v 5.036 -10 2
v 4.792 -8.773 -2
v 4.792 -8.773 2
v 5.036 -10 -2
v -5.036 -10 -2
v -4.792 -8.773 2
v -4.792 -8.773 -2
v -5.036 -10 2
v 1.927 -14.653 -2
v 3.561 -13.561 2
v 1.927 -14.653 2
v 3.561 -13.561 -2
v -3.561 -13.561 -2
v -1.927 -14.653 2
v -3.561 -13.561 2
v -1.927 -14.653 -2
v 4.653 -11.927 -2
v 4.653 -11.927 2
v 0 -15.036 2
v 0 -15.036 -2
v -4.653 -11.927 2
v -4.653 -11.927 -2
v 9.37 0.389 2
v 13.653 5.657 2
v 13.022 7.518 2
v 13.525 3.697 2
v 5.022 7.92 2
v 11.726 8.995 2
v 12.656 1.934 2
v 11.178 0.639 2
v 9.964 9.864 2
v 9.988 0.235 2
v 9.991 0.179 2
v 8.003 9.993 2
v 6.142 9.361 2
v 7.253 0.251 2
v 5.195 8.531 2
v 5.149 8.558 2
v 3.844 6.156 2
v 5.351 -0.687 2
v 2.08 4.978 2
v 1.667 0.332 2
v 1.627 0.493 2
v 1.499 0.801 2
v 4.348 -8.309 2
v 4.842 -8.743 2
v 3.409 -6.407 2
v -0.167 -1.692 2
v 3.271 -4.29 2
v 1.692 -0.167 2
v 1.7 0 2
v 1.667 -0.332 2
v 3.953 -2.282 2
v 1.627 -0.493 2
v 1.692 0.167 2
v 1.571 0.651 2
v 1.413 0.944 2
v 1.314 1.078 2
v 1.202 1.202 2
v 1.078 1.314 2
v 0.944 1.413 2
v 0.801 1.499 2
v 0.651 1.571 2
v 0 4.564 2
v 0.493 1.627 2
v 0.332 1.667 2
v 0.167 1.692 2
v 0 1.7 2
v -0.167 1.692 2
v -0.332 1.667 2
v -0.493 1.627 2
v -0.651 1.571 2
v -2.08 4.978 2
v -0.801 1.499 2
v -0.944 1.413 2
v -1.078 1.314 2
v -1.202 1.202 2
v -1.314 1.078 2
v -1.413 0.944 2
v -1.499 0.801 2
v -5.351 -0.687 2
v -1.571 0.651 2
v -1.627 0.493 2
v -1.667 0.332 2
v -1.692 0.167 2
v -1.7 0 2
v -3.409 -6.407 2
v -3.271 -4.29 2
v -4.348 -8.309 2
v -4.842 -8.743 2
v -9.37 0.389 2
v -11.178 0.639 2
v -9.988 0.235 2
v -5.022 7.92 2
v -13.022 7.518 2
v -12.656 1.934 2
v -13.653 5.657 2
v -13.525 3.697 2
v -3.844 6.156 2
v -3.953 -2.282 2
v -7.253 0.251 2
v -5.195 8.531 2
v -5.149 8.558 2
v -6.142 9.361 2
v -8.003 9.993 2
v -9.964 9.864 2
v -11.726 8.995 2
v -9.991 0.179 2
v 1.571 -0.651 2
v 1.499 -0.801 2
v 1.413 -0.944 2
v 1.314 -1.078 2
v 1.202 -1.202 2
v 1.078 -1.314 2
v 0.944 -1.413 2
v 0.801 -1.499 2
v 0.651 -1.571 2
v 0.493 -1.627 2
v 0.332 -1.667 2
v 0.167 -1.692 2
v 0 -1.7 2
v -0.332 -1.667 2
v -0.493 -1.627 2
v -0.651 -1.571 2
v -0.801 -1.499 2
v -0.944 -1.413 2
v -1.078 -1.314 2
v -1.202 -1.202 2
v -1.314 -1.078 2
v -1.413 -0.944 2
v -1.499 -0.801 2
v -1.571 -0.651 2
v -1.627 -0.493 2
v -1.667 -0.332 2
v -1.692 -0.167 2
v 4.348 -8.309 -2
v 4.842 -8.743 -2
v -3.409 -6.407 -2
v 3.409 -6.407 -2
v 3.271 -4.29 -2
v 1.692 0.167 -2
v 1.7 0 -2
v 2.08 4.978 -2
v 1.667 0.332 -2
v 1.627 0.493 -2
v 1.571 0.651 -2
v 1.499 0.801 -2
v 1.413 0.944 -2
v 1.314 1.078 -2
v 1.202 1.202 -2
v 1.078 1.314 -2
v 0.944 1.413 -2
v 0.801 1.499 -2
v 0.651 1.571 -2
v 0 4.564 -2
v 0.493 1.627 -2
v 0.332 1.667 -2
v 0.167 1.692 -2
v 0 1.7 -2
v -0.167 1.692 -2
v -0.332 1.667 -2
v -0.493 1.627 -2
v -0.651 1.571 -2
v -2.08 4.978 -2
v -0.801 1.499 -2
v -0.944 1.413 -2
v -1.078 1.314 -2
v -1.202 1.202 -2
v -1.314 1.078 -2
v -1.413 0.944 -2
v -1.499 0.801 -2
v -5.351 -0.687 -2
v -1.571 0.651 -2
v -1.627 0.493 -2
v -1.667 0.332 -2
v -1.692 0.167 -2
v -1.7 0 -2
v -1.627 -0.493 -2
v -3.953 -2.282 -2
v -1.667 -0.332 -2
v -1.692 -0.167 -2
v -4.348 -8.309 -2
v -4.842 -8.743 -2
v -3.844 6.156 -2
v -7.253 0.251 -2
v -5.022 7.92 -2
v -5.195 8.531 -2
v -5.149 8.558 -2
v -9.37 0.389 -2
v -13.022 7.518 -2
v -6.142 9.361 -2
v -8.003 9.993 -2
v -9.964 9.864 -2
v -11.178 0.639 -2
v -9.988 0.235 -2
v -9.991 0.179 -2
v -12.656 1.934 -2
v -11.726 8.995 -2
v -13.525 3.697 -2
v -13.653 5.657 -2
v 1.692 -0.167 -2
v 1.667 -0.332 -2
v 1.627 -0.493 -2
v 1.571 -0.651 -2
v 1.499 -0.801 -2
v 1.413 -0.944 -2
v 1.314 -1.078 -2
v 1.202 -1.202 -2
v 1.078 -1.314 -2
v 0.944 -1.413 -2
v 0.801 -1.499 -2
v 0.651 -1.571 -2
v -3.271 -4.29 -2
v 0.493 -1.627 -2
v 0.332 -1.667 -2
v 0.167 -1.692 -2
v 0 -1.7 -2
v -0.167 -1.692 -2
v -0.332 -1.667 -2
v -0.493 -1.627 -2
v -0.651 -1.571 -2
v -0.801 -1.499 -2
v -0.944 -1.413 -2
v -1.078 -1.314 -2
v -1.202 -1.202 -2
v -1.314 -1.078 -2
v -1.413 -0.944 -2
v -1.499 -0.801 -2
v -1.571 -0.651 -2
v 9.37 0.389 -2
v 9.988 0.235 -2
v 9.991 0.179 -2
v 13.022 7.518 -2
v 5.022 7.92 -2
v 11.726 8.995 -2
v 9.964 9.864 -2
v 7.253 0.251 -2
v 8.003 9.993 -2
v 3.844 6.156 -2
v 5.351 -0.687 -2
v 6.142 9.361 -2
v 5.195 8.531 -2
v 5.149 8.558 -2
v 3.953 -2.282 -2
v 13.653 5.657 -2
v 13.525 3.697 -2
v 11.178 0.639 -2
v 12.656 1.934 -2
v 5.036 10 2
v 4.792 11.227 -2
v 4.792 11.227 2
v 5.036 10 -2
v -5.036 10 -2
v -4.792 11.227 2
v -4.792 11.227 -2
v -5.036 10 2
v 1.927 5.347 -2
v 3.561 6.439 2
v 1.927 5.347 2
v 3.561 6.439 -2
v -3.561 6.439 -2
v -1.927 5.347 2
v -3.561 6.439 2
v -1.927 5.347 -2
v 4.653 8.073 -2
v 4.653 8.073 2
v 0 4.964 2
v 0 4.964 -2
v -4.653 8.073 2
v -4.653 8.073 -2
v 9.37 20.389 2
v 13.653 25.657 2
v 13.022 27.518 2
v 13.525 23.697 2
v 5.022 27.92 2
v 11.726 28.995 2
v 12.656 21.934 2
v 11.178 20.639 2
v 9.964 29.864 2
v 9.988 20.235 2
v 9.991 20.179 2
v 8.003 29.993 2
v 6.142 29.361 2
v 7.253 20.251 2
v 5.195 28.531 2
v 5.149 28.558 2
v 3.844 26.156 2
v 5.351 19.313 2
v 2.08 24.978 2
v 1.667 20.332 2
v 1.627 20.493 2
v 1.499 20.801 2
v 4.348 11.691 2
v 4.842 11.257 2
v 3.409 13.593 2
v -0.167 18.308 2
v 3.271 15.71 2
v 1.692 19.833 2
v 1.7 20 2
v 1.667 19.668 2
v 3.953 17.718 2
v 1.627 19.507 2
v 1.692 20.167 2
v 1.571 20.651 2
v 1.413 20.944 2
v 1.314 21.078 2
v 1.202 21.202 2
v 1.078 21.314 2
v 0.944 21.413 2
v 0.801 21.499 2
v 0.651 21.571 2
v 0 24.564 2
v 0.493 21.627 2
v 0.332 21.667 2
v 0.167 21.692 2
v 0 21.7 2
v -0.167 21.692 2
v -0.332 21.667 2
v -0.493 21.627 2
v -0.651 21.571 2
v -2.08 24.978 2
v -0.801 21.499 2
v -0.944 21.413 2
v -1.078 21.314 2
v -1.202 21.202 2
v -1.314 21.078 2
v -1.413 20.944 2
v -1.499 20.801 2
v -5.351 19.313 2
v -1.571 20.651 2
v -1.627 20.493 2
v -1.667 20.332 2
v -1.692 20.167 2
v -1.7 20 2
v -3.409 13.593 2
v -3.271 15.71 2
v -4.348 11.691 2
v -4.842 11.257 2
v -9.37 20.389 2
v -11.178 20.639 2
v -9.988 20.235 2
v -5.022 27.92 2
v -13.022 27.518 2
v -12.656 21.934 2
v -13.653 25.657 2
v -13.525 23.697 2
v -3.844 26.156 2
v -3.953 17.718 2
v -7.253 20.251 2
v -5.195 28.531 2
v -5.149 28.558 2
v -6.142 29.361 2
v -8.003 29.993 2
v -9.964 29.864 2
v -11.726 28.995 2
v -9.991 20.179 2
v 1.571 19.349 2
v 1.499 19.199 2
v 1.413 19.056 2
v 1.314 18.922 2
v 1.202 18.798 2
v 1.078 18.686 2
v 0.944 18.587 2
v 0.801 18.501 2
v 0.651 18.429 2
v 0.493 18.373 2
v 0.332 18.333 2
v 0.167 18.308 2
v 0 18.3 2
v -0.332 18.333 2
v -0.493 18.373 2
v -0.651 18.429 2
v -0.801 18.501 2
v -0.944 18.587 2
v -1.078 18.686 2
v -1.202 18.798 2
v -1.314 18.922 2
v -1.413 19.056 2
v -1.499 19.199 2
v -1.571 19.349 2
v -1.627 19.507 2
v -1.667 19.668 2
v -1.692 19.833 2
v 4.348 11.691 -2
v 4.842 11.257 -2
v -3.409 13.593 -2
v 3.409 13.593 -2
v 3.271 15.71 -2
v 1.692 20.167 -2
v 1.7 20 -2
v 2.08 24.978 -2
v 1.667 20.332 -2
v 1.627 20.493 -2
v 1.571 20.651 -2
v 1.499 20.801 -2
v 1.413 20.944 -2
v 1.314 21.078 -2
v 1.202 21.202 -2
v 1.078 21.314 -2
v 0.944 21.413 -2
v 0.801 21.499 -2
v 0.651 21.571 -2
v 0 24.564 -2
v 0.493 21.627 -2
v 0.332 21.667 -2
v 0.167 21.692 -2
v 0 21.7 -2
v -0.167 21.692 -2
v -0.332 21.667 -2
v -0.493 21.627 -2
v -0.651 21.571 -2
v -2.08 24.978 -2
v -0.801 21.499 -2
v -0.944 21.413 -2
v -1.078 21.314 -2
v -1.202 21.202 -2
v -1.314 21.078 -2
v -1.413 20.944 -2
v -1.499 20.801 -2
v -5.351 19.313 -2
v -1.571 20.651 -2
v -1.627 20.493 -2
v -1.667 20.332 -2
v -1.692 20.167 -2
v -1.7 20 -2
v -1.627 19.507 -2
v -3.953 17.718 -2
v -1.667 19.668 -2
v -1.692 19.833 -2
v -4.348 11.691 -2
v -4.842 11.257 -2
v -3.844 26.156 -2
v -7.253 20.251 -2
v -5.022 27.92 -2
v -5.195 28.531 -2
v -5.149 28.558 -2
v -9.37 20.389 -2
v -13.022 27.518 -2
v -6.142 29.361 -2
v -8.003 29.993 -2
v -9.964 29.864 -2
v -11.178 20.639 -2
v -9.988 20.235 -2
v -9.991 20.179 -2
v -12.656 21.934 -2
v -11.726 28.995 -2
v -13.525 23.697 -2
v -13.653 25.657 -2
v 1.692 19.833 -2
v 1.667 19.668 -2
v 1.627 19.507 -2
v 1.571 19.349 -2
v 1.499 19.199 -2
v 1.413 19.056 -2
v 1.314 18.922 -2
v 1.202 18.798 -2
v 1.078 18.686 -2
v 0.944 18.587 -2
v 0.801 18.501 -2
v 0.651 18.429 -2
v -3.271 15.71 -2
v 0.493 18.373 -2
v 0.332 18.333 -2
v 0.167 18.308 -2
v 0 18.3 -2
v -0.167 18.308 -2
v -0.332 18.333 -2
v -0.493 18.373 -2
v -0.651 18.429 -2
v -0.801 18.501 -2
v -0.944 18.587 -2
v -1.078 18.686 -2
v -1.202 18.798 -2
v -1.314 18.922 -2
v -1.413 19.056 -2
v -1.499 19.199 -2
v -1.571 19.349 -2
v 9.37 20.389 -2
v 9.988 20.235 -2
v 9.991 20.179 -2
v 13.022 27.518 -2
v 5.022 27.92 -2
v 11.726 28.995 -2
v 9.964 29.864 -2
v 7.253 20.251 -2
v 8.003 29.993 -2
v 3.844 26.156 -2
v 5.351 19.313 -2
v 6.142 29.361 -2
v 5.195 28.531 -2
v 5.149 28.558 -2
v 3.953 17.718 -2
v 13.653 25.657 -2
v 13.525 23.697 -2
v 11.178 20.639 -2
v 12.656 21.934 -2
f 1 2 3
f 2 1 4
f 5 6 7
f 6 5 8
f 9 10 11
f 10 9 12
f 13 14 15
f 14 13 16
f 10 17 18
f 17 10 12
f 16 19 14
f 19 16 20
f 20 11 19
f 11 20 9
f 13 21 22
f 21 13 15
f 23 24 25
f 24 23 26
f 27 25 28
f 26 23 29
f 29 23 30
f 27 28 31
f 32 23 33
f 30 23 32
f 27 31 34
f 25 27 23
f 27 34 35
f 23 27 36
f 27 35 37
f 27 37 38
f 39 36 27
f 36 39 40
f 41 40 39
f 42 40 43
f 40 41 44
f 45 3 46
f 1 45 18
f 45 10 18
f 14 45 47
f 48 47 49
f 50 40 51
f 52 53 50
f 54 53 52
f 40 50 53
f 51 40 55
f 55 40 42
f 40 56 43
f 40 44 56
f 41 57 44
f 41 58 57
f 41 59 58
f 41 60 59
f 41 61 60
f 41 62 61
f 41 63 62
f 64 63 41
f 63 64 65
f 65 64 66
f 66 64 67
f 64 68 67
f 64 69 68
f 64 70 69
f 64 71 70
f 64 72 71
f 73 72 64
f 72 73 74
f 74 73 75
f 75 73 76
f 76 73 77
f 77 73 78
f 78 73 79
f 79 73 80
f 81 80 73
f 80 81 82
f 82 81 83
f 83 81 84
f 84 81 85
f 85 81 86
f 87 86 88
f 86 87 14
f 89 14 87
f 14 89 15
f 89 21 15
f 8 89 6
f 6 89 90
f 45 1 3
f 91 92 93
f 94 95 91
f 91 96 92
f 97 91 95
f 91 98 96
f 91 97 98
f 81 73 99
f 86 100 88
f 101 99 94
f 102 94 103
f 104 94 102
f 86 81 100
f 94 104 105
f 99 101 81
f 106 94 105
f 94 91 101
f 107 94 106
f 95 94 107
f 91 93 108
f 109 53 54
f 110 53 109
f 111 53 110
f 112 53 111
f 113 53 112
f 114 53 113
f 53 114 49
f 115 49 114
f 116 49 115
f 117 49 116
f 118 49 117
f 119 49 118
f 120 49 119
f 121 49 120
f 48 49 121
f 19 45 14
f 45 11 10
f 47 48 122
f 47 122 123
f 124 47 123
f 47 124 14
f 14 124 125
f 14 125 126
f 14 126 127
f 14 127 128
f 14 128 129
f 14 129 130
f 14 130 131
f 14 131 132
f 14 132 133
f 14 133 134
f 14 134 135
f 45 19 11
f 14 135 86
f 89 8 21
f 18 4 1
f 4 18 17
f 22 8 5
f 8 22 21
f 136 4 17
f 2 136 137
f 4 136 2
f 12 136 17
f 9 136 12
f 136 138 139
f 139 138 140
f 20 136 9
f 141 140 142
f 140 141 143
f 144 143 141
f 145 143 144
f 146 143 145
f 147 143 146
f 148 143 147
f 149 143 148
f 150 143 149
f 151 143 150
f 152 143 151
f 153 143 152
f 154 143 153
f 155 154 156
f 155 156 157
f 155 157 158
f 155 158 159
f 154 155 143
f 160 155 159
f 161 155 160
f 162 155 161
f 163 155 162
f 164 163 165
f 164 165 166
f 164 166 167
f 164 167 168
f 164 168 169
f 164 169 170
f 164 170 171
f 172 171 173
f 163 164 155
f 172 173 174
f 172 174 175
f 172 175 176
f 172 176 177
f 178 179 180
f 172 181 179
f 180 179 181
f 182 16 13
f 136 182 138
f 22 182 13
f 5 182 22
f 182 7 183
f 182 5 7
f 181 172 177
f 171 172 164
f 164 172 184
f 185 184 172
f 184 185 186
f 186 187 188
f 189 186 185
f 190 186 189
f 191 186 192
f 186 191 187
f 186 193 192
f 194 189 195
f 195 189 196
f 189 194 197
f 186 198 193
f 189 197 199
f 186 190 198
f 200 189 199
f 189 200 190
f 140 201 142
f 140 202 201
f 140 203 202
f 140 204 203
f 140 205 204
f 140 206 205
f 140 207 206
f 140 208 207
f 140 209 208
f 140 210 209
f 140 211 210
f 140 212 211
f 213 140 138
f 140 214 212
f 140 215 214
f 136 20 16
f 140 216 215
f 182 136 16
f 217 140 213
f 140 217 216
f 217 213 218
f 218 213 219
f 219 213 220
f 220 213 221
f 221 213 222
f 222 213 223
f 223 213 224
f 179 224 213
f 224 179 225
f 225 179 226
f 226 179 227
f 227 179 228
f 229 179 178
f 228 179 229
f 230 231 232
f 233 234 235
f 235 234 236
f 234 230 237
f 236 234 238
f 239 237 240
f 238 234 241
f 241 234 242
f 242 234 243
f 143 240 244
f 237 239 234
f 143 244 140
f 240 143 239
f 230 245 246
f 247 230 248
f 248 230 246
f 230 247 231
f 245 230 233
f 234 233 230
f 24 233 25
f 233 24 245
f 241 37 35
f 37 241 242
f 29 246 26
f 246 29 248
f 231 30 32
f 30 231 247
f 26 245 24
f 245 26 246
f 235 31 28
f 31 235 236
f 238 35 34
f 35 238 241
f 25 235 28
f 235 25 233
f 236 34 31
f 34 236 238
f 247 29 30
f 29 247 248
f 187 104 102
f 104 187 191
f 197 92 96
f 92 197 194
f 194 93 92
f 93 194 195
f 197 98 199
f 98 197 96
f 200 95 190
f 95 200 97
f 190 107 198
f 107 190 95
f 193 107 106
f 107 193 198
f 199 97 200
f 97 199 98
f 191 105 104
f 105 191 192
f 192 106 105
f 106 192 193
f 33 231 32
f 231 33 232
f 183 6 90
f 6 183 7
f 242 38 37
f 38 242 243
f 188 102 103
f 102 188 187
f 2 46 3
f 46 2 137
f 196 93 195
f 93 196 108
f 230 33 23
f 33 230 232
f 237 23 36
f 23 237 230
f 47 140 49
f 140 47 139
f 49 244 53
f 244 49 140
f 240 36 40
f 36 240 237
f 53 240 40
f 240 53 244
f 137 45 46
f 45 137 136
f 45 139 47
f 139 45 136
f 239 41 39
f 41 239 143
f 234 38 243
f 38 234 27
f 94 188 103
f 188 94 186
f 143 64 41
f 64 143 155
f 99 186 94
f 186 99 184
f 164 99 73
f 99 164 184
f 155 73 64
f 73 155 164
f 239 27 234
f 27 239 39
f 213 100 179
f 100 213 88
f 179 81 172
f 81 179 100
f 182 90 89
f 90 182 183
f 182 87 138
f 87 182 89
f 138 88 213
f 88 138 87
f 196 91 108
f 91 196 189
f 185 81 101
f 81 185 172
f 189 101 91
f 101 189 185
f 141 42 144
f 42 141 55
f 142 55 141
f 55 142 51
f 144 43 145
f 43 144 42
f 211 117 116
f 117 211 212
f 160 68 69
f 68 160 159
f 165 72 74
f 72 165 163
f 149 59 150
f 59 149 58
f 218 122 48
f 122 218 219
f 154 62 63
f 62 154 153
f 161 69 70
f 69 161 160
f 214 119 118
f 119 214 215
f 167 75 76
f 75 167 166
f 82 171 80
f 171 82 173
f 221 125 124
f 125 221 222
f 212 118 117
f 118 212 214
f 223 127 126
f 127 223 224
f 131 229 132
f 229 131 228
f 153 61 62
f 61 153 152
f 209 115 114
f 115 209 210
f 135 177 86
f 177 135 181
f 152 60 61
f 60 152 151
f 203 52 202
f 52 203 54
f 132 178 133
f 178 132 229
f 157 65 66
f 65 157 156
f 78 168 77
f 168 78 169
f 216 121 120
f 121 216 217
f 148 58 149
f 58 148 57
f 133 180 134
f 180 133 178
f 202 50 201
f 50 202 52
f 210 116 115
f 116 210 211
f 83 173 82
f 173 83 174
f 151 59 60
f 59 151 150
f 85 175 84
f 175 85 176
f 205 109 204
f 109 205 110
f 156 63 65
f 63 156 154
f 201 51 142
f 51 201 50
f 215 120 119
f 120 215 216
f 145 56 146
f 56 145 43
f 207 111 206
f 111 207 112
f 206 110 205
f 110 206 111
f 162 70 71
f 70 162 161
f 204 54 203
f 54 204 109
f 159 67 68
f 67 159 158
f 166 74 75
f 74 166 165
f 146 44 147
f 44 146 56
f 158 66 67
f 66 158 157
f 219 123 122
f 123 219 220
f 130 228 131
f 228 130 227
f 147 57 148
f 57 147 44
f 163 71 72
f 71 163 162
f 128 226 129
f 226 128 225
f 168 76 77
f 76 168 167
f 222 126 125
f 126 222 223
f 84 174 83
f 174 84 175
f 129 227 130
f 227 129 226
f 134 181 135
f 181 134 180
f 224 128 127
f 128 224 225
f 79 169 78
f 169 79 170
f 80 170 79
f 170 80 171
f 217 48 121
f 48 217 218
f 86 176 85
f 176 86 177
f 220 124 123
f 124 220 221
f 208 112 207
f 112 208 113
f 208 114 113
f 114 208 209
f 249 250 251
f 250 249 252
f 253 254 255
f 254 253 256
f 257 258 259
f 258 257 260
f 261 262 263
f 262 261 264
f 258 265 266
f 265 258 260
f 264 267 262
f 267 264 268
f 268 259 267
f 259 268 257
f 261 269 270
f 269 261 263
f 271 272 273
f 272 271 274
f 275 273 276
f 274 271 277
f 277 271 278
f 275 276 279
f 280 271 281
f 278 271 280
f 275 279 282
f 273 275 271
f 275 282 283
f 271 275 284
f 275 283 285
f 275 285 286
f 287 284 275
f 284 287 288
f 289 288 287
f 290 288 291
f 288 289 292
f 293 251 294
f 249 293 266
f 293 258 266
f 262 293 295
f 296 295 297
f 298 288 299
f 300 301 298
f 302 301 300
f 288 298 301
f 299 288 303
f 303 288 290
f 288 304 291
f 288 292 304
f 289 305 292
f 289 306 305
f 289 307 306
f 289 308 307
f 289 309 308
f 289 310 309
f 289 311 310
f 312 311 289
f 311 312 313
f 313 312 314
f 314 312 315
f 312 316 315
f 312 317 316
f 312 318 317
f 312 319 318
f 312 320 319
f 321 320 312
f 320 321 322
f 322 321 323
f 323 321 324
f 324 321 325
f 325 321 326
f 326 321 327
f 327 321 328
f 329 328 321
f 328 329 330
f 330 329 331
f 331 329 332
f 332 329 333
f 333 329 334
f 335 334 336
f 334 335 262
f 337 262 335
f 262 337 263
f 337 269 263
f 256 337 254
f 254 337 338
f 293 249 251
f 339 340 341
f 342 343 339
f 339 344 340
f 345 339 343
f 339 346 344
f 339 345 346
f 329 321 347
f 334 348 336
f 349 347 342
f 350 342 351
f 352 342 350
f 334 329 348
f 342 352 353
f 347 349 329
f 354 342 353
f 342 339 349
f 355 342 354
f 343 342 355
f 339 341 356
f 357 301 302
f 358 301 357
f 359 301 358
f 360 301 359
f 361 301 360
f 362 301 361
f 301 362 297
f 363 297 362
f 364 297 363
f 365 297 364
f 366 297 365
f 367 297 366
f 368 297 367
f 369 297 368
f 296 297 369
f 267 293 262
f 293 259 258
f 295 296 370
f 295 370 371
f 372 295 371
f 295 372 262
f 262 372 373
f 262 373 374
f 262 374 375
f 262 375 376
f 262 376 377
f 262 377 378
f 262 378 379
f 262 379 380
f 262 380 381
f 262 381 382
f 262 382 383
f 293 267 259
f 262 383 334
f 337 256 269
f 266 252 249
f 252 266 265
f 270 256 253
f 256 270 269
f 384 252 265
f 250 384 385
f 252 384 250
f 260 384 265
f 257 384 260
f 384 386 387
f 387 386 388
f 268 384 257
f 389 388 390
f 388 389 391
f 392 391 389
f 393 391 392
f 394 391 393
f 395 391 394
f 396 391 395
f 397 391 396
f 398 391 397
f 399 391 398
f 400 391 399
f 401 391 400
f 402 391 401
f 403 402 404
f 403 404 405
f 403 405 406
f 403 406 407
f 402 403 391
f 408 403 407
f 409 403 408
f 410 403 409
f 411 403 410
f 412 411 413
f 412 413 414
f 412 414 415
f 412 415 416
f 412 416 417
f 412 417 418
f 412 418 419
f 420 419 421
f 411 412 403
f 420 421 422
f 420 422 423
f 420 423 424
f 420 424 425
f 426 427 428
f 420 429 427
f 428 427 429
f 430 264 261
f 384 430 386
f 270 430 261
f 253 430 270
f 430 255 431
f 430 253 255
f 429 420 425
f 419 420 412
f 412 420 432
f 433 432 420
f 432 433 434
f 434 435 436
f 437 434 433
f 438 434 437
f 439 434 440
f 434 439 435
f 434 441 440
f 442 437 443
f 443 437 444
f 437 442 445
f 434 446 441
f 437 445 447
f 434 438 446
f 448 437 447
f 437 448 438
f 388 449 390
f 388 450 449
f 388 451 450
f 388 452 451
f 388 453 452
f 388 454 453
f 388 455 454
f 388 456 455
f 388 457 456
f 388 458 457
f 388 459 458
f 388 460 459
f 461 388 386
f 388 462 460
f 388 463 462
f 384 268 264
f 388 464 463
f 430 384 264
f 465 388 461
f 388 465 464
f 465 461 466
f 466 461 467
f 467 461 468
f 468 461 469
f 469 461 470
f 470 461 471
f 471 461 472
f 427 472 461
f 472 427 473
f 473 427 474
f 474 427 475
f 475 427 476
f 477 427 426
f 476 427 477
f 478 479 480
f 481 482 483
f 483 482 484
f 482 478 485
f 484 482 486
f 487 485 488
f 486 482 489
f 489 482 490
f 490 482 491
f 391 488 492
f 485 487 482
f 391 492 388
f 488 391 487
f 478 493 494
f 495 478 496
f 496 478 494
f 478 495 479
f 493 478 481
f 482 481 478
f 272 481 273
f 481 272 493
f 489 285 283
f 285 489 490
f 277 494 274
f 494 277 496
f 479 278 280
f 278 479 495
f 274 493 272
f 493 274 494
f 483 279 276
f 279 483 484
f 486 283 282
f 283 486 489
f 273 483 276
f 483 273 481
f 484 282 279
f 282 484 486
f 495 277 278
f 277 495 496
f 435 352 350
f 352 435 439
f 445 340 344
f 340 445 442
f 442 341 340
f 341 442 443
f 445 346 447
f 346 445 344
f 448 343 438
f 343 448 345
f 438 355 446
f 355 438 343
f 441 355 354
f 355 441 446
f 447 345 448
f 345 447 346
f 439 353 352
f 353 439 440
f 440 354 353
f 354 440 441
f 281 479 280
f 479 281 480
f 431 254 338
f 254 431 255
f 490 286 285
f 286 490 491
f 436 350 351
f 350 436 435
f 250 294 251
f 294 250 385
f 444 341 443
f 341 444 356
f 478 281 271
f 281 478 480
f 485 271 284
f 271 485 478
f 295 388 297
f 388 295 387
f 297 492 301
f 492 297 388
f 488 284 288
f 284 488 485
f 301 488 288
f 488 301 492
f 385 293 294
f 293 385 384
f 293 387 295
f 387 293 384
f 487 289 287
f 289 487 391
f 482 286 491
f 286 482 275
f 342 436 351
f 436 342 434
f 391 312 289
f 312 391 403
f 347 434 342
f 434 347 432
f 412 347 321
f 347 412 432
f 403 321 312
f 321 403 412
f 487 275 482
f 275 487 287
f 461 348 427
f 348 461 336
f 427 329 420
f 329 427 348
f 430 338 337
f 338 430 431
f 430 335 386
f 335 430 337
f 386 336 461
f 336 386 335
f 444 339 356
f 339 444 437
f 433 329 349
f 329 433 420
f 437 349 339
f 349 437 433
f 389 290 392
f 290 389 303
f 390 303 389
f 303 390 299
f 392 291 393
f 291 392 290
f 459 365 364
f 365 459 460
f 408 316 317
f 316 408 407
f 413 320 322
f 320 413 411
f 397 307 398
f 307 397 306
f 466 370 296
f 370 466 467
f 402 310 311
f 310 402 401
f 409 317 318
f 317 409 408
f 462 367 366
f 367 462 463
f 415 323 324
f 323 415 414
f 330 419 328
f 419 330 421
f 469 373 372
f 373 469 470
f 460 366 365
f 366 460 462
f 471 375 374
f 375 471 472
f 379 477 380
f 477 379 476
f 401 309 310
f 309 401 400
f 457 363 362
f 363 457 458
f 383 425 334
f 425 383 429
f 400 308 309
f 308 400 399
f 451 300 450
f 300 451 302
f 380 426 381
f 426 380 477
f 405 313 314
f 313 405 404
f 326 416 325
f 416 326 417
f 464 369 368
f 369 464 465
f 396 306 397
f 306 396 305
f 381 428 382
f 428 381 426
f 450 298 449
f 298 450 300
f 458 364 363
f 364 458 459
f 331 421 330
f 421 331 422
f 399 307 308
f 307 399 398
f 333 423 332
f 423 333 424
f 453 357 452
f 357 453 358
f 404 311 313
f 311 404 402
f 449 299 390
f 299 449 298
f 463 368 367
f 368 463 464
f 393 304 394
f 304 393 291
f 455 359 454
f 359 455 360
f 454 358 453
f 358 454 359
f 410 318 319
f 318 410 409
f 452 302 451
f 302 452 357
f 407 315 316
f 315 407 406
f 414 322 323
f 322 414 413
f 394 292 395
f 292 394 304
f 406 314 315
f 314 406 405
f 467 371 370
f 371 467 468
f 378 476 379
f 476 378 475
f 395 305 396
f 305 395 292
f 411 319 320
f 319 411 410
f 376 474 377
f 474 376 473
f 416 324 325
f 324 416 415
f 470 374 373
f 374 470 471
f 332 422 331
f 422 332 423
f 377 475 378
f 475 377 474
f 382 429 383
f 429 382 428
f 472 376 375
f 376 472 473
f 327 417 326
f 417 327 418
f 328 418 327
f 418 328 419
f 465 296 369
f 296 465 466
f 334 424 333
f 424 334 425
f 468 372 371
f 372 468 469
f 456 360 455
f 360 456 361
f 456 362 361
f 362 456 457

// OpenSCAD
//ToothShape2D(10);
//GrabWheel(16, 0.4);
//ToothHole(5,10,5,0.4);
/*
translate([15,0,3])
intersection()
{
    difference()
    {
        translate([0,0,-5])
        cube([500,500,10], center=true);
        StraightRailCut(1.5,2,2,3.95,26,0.4);
        CurveRailCut(1.5,2,2,3.95,160,100,0.4);
    }
    translate([-4,10,0])
    cube([20,60,6], center=true);
}
*/
/*
difference()
{
    GrabWheel(1.5,2,2,3.95,10,0.4);
    translate([0,0,1.5])
    cylinder(d=10.2, h=4, center=true, $fn=128);
}
*/


t1 = 3;
t2 = 3;
gearDist = 20;
width=4;
fitting = 0.2;

totalTeeth = t1+t2;


//NewTooth2(width,height,minR,maxR);


//translate([40,0,0])
TestWheel3(width, gearDist, totalTeeth, t1, fitting);
translate([0,gearDist,0])
if(t1%2==0)
{
    rotate([0,0,180/t2])
    TestWheel3(width, gearDist, totalTeeth, t2, fitting);
}
else
{
    TestWheel3(width, gearDist, totalTeeth, t2, fitting);
}



/*
difference()
{
    union()
    {
        translate([0,0,maxR])
        cube([width+2*maxR,2*(maxR+minR)+maxR,2*maxR], center=true);
        NewTooth(width,height,minR,maxR);
    }
    translate([0,minR+maxR,-height])
    rotate([180,0,0])
    NewTooth(width+20,height,minR,maxR);
    translate([0,minR+maxR,-height])
    rotate([200,0,0])
    NewTooth(width,height,minR,maxR);
}

CurveRail(2,3,2,3.95,23,100,0.4);
translate([-100,200,0])
rotate([0,0,180])
CurveRail(2,3,2,3.95,37,150,0.4);
*/

module TestWheel(width, height, minR, maxR, t, fitting)
{
    toothSpacing = 2*(minR+maxR);
    r=t*toothSpacing/(2*PI);
    difference()
    {
        union()
        {
            for(i=[0:t-1])
            {
                rotate([i*(360/t),0,0])
                translate([0,0,-r])
                NewTooth(width,height,minR-fitting,maxR-fitting);
            }
            rotate([0,90,0])
            cylinder(r=r,h=width+2*maxR, $fn=64, center=true);
        }
        for(i=[0:t-1])
        {
            rotate([(i+0.5)*(360/t),0,0])
            translate([0,0,-height-r])
            rotate([180,0,0])
            NewTooth(width,height,minR+fitting,maxR+fitting);
        }
        rotate([0,90,0])
        cylinder(r=r-5,h=width+2*maxR+2, $fn=64, center=true);
        
        rotate([0,90,0])
        translate([0,0,maxR+0.5*width])
        cylinder(r=r+height+minR+maxR,h=2*maxR, $fn=32, center=true);
        rotate([0,-90,0])
        translate([0,0,maxR+0.5*width])
        cylinder(r=r+height+minR+maxR,h=2*maxR, $fn=32, center=true);
        
    }
}

module GrabWheel(smallSize, largeSize, height, toothspacing, t, fitting)
{
    r=t*toothspacing/(2*PI);
    r2=r*(r/pow(r*r+0.75*largeSize*0.75*largeSize,0.5));
    //translate([0,0,r])
    translate([0,0,(largeSize-fitting)])
    rotate([0,90,0])
    union()
    {
        for(i=[0:t-1])
        {
            rotate([i*(360/t),0,0])
            translate([0,0,-r2])
            GrabTooth(smallSize,largeSize,height, fitting);
        }
        rotate([0,90,0])
        cylinder(r=r,h=2*(largeSize-fitting), $fn=256, center=true);
    }
}
    

module GrabTooth(smallSize, largeSize, height, fitting)
{
    translate([0,0,-height])
    hull()
    {
        translate([0,0,fitting])
        ToothShape2D(smallSize-fitting);
        translate([0,0,height-0.1])
        ToothShape2D(largeSize-fitting);
    }
}

module NewTooth(width, height, radiusMin, radiusMax)
{
    hull()
    {
        translate([0.5*width,0,0])
        sphere(r=radiusMax, $fn=16);
        translate([-0.5*width,0,0])
        sphere(r=radiusMax, $fn=16);
        translate([0.5*width,0,-height])
        sphere(r=radiusMin, $fn=16);
        translate([-0.5*width,0,-height])
        sphere(r=radiusMin, $fn=16);
    }
}

module TestWheel2(width, height, minR, maxR, t, fitting)
{
    toothSpacing = 2*(minR+maxR);
    r=t*toothSpacing/(2*PI);
    difference()
    {
        union()
        {
            for(i=[0:t-1])
            {
                rotate([0,0,i*(360/t)])
                translate([0,-r,0])
                NewTooth2(width,height,minR-fitting,maxR-fitting);
            }
            cylinder(r=r,h=width, $fn=64, center=true);
        }
        for(i=[0:t-1])
        {
            rotate([0,0,(i+0.5)*(360/t)])
            translate([0,-height-r,0])
            rotate([0,0,180])
            NewTooth2(width+2,height,minR+fitting,maxR+fitting);
        }
        cylinder(d=10.2,h=width+2*maxR+2, $fn=64, center=true);      
    }
}


module TestWheel3(width, gearDist, totalTeeth, numTeeth, fitting)
{
    teethR = 0.5*gearDist*PI/totalTeeth;
    gearR = numTeeth*gearDist/totalTeeth;
    difference()
    {
        union()
        {
            for(i=[0:numTeeth-1])
            {
                rotate([0,0,i*(360/numTeeth)])
                translate([0,-gearR,0])
                cylinder(r=teethR-fitting, h=width, center=true, $fn=16);
            }
            cylinder(r=gearR, h=width, $fn=64, center=true);
        }
        for(i=[0:numTeeth-1])
        {
            rotate([0,0,(i+0.5)*(360/numTeeth)])
            translate([0,-gearR,0])
            cylinder(r=teethR+fitting, h=width+2, center=true, $fn=16);
        }
        cylinder(d=3.4,h=width+2, $fn=64, center=true);      
    }
}

module NewTooth2(width, height, radiusMin, radiusMax)
{
    hull()
    {
        cylinder(r=radiusMax, h=width, center=true, $fn=32);
        translate([0,-height,0])
        cylinder(r=radiusMin, h=width, center=true, $fn=32);
    }
}
        

module ToothShape2D(size)
{
    hull()
    {
        translate([-0.5*size,0,0])
        cylinder(d=size, h=0.1, $fn=32);
        translate([0.5*size,0,0])
        cylinder(d=size, h=0.1, $fn=32);
    }
}

module ToothHole(smallSize, largeSize, height, fitting)
{
    union()
    {
        translate([0,0,-height])
        hull()
        {
            translate([0,0,0.05-fitting])
            cube([smallSize*1.5+fitting,smallSize+fitting,0.1], center=true);
            translate([0,0,height-0.05])
            cube([largeSize*1.5+fitting,largeSize+fitting,0.1], center=true);
        }
        translate([0,0,0.5])
        cube([largeSize*1.5+fitting,largeSize+fitting,1.01], center=true);
    }
}

module StraightRailCut(smallSize, largeSize, height, toothSpacing, t, fitting)
{
    //border = toothSpacing-largeSize;
    //length = t*toothSpacing+border;
    
    border = 1;
    length = t*4+border;
    translate([0,0,0.001])
    //translate([0,-border+0.5*largeSize,0])
        for(i=[0:t-1])
        {
            //translate([0,i*toothSpacing,0])
            translate([0,i*4,0])
            //ToothHole(smallSize,largeSize,height,fitting);
            GrabTooth(smallSize, largeSize, height, -fitting);
        }
    
}

module CurveRailCut(smallSize, largeSize, height, toothSpacing, t, curveRadius, fitting)
{
   //degreePerTooth = 360/(curveRadius*2*PI/toothSpacing);
   degreePerTooth = 360/(4*40);
   translate([-curveRadius,0,0.001])
   for(i=[0:t-1])
   {
     rotate([0,0,i*degreePerTooth])
     translate([curveRadius,0,0])
     //ToothHole(smallSize,largeSize,height,fitting);
     GrabTooth(smallSize, largeSize, height, -fitting);
   }
}

        
